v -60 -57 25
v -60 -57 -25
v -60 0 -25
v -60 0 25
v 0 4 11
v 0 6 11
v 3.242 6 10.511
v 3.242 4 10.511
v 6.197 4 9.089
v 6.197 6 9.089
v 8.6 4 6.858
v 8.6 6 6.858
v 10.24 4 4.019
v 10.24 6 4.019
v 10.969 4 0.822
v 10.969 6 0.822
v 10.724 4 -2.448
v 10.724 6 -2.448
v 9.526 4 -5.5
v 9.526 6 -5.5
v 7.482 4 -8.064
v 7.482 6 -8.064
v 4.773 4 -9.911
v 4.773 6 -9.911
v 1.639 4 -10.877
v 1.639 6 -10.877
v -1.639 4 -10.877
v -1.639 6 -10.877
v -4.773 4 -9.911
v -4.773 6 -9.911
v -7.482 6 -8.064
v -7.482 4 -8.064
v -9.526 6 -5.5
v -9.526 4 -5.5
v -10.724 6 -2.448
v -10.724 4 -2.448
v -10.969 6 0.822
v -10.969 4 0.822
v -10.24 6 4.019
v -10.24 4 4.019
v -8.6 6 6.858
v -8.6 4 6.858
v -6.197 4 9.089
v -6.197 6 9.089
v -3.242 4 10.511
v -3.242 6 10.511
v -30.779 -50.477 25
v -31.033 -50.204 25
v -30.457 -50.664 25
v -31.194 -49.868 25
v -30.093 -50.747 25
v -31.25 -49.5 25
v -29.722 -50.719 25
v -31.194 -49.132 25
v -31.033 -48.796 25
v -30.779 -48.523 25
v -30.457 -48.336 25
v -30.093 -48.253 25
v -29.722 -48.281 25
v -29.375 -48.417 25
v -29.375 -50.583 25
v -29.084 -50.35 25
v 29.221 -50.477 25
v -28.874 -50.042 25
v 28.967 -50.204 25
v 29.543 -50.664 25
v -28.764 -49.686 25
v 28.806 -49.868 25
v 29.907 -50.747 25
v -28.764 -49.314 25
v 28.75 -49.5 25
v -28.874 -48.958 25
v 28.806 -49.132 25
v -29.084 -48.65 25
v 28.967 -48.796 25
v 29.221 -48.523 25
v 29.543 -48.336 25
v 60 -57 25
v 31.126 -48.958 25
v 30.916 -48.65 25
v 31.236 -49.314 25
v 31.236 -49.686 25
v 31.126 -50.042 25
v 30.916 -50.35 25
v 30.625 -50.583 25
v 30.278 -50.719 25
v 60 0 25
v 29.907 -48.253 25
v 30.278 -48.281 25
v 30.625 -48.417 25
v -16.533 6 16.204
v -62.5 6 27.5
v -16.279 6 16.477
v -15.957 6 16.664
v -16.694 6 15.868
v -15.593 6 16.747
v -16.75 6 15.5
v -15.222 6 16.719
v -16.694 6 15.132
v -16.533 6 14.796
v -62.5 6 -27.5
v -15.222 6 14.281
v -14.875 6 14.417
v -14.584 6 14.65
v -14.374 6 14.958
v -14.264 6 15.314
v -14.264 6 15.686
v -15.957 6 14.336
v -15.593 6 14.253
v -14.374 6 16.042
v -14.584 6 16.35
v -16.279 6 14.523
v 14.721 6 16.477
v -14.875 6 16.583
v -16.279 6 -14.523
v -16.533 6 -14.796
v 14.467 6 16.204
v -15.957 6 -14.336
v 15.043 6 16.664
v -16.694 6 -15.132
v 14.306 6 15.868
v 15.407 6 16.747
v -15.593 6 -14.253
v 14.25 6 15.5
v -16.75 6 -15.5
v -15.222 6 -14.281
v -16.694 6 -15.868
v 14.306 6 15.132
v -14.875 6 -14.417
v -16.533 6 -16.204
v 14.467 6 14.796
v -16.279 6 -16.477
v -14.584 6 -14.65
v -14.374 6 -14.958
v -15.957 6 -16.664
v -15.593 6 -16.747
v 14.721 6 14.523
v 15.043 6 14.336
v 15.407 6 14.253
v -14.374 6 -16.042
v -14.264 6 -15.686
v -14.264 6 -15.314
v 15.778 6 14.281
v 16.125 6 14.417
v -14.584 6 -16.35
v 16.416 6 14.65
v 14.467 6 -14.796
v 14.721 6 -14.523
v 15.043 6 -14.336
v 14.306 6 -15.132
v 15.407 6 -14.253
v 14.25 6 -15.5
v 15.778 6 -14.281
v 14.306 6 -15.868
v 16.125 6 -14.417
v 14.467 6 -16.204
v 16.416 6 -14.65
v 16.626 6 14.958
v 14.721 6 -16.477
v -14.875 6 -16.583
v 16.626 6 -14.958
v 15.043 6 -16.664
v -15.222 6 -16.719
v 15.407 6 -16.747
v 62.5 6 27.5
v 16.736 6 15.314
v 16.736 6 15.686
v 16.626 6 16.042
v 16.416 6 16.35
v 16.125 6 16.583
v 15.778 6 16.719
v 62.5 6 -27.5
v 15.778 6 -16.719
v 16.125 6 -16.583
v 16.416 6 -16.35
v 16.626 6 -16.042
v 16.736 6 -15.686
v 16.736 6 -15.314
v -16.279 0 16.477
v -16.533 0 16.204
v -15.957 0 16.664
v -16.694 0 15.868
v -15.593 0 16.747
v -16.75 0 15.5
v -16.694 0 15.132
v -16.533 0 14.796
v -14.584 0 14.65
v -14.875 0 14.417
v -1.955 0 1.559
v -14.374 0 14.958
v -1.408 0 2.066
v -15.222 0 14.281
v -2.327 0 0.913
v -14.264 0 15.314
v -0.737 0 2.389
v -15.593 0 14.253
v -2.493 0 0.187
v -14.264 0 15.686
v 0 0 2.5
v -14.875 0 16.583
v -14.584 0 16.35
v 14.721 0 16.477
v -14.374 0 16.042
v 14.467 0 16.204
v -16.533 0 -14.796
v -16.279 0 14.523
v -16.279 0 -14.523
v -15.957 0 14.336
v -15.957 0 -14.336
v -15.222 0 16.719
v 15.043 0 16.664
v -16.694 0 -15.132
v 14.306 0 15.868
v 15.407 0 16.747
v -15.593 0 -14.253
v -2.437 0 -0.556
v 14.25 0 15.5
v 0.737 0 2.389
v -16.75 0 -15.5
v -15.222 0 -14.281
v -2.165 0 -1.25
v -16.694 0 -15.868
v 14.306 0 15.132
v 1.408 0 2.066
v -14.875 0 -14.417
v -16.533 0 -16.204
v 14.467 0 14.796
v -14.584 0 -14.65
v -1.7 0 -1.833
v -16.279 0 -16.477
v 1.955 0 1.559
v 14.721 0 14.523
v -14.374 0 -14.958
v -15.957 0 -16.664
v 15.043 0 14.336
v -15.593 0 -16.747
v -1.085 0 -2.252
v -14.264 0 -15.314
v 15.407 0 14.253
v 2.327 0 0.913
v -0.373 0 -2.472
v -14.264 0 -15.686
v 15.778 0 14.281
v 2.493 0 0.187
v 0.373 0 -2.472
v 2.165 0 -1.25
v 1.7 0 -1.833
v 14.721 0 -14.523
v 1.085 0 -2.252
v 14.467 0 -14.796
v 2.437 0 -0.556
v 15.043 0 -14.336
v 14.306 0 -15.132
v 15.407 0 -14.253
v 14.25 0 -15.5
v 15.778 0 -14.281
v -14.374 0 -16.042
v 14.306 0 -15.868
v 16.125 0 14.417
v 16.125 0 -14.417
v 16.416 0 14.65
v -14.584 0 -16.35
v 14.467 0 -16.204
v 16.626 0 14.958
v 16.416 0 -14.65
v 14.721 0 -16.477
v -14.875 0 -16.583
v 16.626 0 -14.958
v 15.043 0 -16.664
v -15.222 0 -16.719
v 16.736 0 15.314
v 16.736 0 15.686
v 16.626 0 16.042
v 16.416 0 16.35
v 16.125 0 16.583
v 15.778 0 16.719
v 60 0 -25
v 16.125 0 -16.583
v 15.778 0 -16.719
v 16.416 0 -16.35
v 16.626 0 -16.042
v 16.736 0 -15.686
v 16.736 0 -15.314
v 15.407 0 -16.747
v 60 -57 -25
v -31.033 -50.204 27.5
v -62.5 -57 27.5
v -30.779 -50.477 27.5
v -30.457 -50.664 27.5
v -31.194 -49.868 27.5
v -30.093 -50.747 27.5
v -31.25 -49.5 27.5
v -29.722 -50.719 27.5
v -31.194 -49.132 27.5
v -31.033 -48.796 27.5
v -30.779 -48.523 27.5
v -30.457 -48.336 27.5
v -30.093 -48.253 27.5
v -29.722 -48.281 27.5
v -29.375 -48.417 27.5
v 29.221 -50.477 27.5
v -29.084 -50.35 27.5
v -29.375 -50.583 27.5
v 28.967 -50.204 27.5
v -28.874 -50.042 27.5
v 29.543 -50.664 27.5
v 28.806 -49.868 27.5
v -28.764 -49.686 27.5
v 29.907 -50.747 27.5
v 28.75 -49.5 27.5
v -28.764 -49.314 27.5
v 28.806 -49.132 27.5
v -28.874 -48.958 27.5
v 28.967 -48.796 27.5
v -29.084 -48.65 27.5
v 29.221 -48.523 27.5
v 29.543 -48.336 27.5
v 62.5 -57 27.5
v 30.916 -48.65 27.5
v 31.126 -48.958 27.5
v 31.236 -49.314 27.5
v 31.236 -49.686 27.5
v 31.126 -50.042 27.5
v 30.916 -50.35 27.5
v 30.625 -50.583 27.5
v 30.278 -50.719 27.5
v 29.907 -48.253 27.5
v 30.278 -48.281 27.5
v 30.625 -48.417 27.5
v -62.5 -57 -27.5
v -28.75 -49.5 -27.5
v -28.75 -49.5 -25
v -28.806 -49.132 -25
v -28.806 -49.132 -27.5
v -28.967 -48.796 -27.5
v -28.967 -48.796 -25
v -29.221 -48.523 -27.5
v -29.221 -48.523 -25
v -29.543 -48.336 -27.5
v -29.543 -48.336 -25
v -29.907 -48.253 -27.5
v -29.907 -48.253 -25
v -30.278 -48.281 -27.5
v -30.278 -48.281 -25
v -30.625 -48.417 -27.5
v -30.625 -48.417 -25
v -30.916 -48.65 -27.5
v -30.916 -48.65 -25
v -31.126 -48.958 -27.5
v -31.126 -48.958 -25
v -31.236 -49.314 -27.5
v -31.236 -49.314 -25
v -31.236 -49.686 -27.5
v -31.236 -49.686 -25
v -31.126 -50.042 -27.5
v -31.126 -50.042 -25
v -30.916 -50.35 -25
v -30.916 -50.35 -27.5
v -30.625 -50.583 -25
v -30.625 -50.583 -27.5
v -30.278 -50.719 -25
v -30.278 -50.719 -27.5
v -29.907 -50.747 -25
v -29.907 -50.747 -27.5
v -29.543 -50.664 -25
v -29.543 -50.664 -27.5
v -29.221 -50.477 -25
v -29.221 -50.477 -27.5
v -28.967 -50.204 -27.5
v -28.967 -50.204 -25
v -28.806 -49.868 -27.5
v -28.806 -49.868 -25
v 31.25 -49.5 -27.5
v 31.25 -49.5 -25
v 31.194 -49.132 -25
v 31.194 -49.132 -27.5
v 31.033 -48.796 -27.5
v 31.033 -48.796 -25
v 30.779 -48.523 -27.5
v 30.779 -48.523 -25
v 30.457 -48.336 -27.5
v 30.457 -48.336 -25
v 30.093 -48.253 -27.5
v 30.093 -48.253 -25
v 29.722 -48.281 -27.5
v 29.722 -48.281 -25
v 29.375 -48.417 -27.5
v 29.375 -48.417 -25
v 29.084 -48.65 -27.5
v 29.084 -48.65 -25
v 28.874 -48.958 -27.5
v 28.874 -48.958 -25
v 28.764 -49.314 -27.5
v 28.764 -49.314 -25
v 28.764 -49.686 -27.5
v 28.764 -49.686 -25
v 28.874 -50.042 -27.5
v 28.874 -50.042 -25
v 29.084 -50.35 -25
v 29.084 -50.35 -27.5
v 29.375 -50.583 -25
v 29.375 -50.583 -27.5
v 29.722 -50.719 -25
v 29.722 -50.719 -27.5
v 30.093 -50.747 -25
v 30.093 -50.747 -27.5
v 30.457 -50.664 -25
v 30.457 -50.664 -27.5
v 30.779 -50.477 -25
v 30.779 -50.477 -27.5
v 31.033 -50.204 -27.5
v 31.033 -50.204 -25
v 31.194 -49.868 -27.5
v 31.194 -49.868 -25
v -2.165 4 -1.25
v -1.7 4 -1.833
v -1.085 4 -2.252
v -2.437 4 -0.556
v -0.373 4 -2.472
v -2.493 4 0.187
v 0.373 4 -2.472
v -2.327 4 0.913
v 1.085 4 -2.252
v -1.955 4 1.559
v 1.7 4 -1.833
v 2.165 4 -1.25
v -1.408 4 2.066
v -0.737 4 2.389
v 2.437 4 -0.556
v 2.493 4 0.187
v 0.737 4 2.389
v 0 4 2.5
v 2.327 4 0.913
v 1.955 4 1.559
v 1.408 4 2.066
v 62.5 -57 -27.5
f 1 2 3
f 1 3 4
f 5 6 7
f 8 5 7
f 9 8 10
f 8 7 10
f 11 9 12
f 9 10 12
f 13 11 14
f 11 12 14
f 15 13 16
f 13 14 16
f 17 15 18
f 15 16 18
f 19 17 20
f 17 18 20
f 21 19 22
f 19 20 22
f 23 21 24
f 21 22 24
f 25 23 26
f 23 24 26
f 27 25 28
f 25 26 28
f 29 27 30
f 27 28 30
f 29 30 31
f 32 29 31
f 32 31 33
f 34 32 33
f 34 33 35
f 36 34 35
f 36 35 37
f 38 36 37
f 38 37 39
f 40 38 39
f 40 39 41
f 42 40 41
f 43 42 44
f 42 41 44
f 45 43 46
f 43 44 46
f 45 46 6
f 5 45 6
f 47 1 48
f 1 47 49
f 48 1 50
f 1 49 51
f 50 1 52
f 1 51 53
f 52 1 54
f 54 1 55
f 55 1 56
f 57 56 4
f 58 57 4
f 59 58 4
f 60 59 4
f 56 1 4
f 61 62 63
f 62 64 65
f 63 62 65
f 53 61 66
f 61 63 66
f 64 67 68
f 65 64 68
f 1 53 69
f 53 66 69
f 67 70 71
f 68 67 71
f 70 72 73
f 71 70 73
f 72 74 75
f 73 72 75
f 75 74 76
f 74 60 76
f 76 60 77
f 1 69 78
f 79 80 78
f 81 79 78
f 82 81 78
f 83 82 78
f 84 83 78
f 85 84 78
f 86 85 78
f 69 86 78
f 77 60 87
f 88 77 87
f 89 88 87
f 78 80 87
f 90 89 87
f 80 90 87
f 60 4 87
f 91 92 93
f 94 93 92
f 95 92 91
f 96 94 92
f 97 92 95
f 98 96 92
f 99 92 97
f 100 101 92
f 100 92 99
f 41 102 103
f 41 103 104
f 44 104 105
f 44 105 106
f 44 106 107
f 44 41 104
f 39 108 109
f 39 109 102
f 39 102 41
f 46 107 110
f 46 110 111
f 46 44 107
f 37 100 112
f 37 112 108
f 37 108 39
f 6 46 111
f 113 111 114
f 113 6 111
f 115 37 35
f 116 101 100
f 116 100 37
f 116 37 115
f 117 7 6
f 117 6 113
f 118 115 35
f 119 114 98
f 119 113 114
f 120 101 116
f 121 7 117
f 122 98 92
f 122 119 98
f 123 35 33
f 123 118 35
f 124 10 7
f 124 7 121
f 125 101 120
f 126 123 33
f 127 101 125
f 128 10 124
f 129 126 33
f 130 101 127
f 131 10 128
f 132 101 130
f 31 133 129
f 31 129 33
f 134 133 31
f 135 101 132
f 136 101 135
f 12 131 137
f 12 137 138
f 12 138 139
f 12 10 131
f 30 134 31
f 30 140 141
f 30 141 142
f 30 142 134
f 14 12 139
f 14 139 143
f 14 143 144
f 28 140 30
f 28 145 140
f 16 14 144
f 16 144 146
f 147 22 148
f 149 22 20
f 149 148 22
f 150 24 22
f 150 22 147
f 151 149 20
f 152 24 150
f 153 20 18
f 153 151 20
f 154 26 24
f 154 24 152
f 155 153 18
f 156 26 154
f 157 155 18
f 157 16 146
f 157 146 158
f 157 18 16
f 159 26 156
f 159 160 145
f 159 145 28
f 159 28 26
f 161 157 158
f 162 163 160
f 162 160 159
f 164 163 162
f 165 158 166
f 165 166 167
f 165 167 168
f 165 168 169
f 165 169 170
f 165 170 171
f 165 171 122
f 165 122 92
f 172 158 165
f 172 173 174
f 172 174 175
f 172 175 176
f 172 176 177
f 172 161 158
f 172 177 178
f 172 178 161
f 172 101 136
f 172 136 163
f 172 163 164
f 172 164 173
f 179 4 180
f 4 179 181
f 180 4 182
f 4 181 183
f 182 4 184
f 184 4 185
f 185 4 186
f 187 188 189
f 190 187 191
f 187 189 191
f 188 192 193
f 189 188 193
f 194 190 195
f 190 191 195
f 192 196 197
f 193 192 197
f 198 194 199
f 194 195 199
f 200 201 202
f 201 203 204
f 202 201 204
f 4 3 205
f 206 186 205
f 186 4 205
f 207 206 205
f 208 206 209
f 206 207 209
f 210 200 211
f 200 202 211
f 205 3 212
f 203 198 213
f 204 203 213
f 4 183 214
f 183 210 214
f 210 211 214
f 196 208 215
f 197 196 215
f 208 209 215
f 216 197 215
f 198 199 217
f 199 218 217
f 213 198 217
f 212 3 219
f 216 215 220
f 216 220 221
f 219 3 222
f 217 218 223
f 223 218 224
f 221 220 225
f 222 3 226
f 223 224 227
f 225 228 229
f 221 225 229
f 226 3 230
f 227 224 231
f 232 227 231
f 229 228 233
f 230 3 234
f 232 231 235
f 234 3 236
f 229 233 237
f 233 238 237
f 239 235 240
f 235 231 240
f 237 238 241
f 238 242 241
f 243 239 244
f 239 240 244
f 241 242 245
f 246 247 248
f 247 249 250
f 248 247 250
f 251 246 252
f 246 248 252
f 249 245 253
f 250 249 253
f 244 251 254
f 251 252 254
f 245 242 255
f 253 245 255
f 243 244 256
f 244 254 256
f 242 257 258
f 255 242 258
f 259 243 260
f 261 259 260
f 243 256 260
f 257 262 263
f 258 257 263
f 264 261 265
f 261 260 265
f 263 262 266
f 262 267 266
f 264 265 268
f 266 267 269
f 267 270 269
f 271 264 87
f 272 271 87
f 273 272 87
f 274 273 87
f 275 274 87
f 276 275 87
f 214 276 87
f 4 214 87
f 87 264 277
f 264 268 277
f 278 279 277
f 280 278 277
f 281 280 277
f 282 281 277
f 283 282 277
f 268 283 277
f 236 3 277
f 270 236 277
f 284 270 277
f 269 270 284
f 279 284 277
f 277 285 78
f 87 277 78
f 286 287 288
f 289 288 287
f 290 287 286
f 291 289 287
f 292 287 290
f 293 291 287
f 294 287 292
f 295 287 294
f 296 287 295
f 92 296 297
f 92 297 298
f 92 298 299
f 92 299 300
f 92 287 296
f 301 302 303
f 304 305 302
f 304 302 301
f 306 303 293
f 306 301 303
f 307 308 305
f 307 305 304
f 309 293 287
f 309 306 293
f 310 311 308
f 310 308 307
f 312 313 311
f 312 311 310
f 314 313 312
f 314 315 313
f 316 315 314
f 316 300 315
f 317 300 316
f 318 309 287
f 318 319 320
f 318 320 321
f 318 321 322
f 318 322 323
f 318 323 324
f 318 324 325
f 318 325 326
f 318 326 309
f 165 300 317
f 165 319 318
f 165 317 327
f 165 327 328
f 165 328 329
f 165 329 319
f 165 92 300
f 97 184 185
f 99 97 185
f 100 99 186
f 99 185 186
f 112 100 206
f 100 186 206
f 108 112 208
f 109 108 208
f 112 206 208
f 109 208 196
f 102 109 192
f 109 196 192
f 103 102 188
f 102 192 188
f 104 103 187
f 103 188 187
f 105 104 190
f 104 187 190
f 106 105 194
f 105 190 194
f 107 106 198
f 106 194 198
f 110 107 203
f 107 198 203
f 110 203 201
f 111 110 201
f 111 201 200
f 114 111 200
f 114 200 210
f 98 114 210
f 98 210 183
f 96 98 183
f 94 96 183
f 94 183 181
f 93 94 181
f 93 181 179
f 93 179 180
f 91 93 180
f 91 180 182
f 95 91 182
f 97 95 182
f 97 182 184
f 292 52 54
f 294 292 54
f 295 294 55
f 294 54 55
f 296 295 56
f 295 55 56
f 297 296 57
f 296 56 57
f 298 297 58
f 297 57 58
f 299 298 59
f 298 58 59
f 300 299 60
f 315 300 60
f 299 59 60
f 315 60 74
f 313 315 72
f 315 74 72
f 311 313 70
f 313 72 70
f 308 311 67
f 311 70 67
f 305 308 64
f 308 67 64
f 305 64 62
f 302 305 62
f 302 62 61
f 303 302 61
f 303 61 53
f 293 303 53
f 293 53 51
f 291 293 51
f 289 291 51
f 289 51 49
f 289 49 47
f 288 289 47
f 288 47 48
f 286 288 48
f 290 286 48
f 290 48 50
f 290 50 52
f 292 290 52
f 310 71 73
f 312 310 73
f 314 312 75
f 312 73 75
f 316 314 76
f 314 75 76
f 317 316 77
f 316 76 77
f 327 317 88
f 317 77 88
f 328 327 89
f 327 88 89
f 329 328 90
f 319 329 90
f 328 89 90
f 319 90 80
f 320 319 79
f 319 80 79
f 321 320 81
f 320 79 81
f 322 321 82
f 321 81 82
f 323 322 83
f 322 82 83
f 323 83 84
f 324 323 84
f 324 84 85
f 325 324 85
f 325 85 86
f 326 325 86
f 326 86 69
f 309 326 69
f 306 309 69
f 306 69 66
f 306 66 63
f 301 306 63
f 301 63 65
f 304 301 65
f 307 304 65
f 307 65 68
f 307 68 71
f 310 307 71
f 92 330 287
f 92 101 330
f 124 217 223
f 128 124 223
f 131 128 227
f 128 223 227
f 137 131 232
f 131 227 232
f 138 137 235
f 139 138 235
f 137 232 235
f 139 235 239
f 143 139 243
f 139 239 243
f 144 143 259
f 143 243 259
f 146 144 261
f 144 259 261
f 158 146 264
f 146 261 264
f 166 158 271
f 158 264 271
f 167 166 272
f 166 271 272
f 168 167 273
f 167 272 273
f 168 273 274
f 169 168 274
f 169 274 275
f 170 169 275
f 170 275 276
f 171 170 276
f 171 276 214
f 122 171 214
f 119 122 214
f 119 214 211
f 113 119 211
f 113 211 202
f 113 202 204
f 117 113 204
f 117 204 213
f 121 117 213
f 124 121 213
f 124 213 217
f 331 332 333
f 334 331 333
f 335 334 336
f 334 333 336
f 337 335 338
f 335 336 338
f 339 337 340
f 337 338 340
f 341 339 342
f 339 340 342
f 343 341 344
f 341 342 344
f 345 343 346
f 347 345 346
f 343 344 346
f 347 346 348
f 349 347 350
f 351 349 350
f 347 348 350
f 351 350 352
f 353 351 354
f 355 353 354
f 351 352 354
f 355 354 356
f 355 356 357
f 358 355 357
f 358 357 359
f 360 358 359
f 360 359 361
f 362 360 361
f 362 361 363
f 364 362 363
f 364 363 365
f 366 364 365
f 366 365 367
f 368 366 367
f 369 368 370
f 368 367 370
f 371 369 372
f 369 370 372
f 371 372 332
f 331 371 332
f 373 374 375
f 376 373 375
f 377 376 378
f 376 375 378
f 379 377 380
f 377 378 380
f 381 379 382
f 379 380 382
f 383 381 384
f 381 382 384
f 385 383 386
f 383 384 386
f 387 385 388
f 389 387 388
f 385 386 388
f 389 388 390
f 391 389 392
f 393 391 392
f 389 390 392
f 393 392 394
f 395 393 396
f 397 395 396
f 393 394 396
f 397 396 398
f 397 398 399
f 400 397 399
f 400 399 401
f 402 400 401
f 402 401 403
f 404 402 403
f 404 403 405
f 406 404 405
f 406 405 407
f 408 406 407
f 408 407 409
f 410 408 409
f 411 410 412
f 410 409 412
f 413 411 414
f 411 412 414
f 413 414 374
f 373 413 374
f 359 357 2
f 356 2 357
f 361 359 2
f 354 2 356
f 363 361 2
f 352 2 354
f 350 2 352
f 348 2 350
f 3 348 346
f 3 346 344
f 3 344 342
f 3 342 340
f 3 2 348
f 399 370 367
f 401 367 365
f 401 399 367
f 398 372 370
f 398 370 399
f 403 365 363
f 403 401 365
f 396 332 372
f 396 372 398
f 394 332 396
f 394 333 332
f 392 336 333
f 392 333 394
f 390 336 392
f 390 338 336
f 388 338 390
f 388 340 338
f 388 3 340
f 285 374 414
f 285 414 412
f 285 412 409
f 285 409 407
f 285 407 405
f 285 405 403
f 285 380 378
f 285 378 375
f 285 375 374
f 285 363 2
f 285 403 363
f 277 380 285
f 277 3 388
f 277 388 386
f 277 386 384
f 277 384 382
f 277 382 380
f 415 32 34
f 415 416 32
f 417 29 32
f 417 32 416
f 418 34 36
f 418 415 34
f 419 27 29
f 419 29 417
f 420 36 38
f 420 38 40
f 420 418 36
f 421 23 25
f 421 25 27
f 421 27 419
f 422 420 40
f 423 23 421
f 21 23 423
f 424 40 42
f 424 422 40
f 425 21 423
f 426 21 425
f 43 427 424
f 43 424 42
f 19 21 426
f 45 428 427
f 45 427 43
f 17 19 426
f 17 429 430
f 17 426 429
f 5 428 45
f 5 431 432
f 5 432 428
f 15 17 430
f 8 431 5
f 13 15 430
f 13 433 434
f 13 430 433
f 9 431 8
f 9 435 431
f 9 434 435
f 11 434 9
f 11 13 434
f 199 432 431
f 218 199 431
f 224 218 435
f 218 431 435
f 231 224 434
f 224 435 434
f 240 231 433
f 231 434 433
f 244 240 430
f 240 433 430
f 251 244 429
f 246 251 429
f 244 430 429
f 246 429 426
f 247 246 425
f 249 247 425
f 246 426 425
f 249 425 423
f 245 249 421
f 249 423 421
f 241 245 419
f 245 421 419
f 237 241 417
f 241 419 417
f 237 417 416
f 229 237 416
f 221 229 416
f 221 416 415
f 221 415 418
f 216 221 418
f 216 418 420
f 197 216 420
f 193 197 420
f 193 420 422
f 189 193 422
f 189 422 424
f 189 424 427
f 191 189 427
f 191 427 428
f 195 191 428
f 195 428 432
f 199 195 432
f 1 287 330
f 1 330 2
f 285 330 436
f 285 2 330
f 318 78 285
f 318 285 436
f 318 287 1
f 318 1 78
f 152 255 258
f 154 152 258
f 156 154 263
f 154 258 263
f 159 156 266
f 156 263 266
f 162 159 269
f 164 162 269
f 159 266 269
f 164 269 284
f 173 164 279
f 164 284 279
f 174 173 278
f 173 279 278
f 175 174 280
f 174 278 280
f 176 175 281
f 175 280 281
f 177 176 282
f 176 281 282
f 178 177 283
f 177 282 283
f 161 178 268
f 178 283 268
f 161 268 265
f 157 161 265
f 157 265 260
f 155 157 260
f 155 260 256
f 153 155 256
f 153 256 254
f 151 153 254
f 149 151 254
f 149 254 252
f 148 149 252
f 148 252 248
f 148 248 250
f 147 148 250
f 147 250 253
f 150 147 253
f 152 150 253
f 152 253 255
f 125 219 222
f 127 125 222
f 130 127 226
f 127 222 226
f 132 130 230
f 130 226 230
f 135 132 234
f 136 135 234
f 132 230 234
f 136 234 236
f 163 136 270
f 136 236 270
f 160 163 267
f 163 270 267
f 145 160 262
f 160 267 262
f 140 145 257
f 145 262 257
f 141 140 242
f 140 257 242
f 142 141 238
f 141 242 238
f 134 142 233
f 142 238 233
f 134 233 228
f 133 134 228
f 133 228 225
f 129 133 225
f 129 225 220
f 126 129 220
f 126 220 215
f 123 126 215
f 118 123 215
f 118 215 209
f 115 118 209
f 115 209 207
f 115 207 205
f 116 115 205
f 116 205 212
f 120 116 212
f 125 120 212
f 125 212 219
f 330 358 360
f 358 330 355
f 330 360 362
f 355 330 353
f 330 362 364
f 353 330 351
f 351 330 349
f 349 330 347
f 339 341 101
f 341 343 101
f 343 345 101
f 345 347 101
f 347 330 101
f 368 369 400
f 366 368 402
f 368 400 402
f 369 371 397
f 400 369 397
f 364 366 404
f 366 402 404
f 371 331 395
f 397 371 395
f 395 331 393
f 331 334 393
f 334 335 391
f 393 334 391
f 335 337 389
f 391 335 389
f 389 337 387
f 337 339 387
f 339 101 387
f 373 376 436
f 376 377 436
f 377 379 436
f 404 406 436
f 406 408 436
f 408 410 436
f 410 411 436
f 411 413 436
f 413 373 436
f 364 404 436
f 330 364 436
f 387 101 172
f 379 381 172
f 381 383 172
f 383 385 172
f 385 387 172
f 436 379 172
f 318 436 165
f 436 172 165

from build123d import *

# Parameters (mm, degrees)
SKETCH_1_W             = 125
SKETCH_1_H             = 55
EXTRUDE_1_DEPTH        = 6
SKETCH_2_R             = 11
CUT_EXTRUDE_1_DEPTH    = 2
CUT_EXTRUDE_2_REACH    = 70.4
SKETCH_3_R             = 2.5
HOLE_WIZARD_M3_1_D     = 2.5
HOLE_WIZARD_M3_1_DEPTH = 7.5
HOLE_WIZARD_M3_1_TIP   = 0.751075774
SKETCH_6_W             = 125
SKETCH_6_H             = 55
SKETCH_6_W_2           = 120
SKETCH_6_H_2           = 50
EXTRUDE_2_DEPTH        = 57
HOLE_WIZARD_M3_2_D     = 2.5
HOLE_WIZARD_M3_2_DEPTH = 2.5
HOLE_WIZARD_M3_3_D     = 2.5


with BuildPart() as part:
    # 草图1 → 凸台-拉伸1 (new body)
    with BuildSketch(Plane(origin=(0, 0, 0), x_dir=(1, 0, 0), z_dir=(0, 1, 0))):
        Rectangle(SKETCH_1_W, SKETCH_1_H)
    extrude(amount=EXTRUDE_1_DEPTH)

    # 草图2 → 切除-拉伸1 (cut)
    with BuildSketch(Plane(origin=(0, 6, 0), x_dir=(1, 0, 0), z_dir=(0, 1, 0))):
        with Locations(Location((0, 0, 0), (0, 0, 270))):
            Circle(SKETCH_2_R)
    extrude(amount=-CUT_EXTRUDE_1_DEPTH, mode=Mode.SUBTRACT)

    # 草图3 → 切除-拉伸2 (cut, up to next)
    with BuildSketch(Plane(origin=(0, 4, 0), x_dir=(1, 0, 0), z_dir=(0, 1, 0)), mode=Mode.PRIVATE) as cut_extrude_2_sk1:
        with Locations(Location((0, 0, 0), (0, 0, 270))):
            Circle(SKETCH_3_R)
    cut_extrude_2_tool1 = extrude(cut_extrude_2_sk1.sketch, amount=-CUT_EXTRUDE_2_REACH, mode=Mode.PRIVATE) & part.part
    add(cut_extrude_2_tool1.solids().sort_by_distance((0, 4, 0))[0], mode=Mode.SUBTRACT)

    # M3 螺纹孔1
    with Locations(Plane(origin=(0, 6, 0), x_dir=(1, 0, 0), z_dir=(0, 1, 0))):
        with Locations((15.5, 15.5), (15.5, -15.5), (-15.5, -15.5), (-15.5, 15.5)):
            Hole(HOLE_WIZARD_M3_1_D / 2, depth=HOLE_WIZARD_M3_1_DEPTH)
            with Locations((0, 0, -(HOLE_WIZARD_M3_1_DEPTH + HOLE_WIZARD_M3_1_TIP / 2))):  # 118° drill point
                Cone(0, HOLE_WIZARD_M3_1_D / 2, HOLE_WIZARD_M3_1_TIP, mode=Mode.SUBTRACT)

    # 草图6 → 凸台-拉伸2 (add)
    with BuildSketch(Plane.XZ):
        Rectangle(SKETCH_6_W, SKETCH_6_H)
        Rectangle(SKETCH_6_W_2, SKETCH_6_H_2, mode=Mode.SUBTRACT)
    extrude(amount=EXTRUDE_2_DEPTH)

    # M3 螺纹孔2
    with Locations(Plane(origin=(0, 0, -27.5), x_dir=(-1, 0, 0), z_dir=(0, 0, -1))):
        with Locations((30, -49.5), (-30, -49.5)):
            Hole(HOLE_WIZARD_M3_2_D / 2, depth=HOLE_WIZARD_M3_2_DEPTH)

    # M3 螺纹孔3 (through all)
    with Locations(Plane.XY.offset(27.5)):
        with Locations((30, -49.5), (-30, -49.5)):
            Hole(HOLE_WIZARD_M3_3_D / 2)


solid = part.part
